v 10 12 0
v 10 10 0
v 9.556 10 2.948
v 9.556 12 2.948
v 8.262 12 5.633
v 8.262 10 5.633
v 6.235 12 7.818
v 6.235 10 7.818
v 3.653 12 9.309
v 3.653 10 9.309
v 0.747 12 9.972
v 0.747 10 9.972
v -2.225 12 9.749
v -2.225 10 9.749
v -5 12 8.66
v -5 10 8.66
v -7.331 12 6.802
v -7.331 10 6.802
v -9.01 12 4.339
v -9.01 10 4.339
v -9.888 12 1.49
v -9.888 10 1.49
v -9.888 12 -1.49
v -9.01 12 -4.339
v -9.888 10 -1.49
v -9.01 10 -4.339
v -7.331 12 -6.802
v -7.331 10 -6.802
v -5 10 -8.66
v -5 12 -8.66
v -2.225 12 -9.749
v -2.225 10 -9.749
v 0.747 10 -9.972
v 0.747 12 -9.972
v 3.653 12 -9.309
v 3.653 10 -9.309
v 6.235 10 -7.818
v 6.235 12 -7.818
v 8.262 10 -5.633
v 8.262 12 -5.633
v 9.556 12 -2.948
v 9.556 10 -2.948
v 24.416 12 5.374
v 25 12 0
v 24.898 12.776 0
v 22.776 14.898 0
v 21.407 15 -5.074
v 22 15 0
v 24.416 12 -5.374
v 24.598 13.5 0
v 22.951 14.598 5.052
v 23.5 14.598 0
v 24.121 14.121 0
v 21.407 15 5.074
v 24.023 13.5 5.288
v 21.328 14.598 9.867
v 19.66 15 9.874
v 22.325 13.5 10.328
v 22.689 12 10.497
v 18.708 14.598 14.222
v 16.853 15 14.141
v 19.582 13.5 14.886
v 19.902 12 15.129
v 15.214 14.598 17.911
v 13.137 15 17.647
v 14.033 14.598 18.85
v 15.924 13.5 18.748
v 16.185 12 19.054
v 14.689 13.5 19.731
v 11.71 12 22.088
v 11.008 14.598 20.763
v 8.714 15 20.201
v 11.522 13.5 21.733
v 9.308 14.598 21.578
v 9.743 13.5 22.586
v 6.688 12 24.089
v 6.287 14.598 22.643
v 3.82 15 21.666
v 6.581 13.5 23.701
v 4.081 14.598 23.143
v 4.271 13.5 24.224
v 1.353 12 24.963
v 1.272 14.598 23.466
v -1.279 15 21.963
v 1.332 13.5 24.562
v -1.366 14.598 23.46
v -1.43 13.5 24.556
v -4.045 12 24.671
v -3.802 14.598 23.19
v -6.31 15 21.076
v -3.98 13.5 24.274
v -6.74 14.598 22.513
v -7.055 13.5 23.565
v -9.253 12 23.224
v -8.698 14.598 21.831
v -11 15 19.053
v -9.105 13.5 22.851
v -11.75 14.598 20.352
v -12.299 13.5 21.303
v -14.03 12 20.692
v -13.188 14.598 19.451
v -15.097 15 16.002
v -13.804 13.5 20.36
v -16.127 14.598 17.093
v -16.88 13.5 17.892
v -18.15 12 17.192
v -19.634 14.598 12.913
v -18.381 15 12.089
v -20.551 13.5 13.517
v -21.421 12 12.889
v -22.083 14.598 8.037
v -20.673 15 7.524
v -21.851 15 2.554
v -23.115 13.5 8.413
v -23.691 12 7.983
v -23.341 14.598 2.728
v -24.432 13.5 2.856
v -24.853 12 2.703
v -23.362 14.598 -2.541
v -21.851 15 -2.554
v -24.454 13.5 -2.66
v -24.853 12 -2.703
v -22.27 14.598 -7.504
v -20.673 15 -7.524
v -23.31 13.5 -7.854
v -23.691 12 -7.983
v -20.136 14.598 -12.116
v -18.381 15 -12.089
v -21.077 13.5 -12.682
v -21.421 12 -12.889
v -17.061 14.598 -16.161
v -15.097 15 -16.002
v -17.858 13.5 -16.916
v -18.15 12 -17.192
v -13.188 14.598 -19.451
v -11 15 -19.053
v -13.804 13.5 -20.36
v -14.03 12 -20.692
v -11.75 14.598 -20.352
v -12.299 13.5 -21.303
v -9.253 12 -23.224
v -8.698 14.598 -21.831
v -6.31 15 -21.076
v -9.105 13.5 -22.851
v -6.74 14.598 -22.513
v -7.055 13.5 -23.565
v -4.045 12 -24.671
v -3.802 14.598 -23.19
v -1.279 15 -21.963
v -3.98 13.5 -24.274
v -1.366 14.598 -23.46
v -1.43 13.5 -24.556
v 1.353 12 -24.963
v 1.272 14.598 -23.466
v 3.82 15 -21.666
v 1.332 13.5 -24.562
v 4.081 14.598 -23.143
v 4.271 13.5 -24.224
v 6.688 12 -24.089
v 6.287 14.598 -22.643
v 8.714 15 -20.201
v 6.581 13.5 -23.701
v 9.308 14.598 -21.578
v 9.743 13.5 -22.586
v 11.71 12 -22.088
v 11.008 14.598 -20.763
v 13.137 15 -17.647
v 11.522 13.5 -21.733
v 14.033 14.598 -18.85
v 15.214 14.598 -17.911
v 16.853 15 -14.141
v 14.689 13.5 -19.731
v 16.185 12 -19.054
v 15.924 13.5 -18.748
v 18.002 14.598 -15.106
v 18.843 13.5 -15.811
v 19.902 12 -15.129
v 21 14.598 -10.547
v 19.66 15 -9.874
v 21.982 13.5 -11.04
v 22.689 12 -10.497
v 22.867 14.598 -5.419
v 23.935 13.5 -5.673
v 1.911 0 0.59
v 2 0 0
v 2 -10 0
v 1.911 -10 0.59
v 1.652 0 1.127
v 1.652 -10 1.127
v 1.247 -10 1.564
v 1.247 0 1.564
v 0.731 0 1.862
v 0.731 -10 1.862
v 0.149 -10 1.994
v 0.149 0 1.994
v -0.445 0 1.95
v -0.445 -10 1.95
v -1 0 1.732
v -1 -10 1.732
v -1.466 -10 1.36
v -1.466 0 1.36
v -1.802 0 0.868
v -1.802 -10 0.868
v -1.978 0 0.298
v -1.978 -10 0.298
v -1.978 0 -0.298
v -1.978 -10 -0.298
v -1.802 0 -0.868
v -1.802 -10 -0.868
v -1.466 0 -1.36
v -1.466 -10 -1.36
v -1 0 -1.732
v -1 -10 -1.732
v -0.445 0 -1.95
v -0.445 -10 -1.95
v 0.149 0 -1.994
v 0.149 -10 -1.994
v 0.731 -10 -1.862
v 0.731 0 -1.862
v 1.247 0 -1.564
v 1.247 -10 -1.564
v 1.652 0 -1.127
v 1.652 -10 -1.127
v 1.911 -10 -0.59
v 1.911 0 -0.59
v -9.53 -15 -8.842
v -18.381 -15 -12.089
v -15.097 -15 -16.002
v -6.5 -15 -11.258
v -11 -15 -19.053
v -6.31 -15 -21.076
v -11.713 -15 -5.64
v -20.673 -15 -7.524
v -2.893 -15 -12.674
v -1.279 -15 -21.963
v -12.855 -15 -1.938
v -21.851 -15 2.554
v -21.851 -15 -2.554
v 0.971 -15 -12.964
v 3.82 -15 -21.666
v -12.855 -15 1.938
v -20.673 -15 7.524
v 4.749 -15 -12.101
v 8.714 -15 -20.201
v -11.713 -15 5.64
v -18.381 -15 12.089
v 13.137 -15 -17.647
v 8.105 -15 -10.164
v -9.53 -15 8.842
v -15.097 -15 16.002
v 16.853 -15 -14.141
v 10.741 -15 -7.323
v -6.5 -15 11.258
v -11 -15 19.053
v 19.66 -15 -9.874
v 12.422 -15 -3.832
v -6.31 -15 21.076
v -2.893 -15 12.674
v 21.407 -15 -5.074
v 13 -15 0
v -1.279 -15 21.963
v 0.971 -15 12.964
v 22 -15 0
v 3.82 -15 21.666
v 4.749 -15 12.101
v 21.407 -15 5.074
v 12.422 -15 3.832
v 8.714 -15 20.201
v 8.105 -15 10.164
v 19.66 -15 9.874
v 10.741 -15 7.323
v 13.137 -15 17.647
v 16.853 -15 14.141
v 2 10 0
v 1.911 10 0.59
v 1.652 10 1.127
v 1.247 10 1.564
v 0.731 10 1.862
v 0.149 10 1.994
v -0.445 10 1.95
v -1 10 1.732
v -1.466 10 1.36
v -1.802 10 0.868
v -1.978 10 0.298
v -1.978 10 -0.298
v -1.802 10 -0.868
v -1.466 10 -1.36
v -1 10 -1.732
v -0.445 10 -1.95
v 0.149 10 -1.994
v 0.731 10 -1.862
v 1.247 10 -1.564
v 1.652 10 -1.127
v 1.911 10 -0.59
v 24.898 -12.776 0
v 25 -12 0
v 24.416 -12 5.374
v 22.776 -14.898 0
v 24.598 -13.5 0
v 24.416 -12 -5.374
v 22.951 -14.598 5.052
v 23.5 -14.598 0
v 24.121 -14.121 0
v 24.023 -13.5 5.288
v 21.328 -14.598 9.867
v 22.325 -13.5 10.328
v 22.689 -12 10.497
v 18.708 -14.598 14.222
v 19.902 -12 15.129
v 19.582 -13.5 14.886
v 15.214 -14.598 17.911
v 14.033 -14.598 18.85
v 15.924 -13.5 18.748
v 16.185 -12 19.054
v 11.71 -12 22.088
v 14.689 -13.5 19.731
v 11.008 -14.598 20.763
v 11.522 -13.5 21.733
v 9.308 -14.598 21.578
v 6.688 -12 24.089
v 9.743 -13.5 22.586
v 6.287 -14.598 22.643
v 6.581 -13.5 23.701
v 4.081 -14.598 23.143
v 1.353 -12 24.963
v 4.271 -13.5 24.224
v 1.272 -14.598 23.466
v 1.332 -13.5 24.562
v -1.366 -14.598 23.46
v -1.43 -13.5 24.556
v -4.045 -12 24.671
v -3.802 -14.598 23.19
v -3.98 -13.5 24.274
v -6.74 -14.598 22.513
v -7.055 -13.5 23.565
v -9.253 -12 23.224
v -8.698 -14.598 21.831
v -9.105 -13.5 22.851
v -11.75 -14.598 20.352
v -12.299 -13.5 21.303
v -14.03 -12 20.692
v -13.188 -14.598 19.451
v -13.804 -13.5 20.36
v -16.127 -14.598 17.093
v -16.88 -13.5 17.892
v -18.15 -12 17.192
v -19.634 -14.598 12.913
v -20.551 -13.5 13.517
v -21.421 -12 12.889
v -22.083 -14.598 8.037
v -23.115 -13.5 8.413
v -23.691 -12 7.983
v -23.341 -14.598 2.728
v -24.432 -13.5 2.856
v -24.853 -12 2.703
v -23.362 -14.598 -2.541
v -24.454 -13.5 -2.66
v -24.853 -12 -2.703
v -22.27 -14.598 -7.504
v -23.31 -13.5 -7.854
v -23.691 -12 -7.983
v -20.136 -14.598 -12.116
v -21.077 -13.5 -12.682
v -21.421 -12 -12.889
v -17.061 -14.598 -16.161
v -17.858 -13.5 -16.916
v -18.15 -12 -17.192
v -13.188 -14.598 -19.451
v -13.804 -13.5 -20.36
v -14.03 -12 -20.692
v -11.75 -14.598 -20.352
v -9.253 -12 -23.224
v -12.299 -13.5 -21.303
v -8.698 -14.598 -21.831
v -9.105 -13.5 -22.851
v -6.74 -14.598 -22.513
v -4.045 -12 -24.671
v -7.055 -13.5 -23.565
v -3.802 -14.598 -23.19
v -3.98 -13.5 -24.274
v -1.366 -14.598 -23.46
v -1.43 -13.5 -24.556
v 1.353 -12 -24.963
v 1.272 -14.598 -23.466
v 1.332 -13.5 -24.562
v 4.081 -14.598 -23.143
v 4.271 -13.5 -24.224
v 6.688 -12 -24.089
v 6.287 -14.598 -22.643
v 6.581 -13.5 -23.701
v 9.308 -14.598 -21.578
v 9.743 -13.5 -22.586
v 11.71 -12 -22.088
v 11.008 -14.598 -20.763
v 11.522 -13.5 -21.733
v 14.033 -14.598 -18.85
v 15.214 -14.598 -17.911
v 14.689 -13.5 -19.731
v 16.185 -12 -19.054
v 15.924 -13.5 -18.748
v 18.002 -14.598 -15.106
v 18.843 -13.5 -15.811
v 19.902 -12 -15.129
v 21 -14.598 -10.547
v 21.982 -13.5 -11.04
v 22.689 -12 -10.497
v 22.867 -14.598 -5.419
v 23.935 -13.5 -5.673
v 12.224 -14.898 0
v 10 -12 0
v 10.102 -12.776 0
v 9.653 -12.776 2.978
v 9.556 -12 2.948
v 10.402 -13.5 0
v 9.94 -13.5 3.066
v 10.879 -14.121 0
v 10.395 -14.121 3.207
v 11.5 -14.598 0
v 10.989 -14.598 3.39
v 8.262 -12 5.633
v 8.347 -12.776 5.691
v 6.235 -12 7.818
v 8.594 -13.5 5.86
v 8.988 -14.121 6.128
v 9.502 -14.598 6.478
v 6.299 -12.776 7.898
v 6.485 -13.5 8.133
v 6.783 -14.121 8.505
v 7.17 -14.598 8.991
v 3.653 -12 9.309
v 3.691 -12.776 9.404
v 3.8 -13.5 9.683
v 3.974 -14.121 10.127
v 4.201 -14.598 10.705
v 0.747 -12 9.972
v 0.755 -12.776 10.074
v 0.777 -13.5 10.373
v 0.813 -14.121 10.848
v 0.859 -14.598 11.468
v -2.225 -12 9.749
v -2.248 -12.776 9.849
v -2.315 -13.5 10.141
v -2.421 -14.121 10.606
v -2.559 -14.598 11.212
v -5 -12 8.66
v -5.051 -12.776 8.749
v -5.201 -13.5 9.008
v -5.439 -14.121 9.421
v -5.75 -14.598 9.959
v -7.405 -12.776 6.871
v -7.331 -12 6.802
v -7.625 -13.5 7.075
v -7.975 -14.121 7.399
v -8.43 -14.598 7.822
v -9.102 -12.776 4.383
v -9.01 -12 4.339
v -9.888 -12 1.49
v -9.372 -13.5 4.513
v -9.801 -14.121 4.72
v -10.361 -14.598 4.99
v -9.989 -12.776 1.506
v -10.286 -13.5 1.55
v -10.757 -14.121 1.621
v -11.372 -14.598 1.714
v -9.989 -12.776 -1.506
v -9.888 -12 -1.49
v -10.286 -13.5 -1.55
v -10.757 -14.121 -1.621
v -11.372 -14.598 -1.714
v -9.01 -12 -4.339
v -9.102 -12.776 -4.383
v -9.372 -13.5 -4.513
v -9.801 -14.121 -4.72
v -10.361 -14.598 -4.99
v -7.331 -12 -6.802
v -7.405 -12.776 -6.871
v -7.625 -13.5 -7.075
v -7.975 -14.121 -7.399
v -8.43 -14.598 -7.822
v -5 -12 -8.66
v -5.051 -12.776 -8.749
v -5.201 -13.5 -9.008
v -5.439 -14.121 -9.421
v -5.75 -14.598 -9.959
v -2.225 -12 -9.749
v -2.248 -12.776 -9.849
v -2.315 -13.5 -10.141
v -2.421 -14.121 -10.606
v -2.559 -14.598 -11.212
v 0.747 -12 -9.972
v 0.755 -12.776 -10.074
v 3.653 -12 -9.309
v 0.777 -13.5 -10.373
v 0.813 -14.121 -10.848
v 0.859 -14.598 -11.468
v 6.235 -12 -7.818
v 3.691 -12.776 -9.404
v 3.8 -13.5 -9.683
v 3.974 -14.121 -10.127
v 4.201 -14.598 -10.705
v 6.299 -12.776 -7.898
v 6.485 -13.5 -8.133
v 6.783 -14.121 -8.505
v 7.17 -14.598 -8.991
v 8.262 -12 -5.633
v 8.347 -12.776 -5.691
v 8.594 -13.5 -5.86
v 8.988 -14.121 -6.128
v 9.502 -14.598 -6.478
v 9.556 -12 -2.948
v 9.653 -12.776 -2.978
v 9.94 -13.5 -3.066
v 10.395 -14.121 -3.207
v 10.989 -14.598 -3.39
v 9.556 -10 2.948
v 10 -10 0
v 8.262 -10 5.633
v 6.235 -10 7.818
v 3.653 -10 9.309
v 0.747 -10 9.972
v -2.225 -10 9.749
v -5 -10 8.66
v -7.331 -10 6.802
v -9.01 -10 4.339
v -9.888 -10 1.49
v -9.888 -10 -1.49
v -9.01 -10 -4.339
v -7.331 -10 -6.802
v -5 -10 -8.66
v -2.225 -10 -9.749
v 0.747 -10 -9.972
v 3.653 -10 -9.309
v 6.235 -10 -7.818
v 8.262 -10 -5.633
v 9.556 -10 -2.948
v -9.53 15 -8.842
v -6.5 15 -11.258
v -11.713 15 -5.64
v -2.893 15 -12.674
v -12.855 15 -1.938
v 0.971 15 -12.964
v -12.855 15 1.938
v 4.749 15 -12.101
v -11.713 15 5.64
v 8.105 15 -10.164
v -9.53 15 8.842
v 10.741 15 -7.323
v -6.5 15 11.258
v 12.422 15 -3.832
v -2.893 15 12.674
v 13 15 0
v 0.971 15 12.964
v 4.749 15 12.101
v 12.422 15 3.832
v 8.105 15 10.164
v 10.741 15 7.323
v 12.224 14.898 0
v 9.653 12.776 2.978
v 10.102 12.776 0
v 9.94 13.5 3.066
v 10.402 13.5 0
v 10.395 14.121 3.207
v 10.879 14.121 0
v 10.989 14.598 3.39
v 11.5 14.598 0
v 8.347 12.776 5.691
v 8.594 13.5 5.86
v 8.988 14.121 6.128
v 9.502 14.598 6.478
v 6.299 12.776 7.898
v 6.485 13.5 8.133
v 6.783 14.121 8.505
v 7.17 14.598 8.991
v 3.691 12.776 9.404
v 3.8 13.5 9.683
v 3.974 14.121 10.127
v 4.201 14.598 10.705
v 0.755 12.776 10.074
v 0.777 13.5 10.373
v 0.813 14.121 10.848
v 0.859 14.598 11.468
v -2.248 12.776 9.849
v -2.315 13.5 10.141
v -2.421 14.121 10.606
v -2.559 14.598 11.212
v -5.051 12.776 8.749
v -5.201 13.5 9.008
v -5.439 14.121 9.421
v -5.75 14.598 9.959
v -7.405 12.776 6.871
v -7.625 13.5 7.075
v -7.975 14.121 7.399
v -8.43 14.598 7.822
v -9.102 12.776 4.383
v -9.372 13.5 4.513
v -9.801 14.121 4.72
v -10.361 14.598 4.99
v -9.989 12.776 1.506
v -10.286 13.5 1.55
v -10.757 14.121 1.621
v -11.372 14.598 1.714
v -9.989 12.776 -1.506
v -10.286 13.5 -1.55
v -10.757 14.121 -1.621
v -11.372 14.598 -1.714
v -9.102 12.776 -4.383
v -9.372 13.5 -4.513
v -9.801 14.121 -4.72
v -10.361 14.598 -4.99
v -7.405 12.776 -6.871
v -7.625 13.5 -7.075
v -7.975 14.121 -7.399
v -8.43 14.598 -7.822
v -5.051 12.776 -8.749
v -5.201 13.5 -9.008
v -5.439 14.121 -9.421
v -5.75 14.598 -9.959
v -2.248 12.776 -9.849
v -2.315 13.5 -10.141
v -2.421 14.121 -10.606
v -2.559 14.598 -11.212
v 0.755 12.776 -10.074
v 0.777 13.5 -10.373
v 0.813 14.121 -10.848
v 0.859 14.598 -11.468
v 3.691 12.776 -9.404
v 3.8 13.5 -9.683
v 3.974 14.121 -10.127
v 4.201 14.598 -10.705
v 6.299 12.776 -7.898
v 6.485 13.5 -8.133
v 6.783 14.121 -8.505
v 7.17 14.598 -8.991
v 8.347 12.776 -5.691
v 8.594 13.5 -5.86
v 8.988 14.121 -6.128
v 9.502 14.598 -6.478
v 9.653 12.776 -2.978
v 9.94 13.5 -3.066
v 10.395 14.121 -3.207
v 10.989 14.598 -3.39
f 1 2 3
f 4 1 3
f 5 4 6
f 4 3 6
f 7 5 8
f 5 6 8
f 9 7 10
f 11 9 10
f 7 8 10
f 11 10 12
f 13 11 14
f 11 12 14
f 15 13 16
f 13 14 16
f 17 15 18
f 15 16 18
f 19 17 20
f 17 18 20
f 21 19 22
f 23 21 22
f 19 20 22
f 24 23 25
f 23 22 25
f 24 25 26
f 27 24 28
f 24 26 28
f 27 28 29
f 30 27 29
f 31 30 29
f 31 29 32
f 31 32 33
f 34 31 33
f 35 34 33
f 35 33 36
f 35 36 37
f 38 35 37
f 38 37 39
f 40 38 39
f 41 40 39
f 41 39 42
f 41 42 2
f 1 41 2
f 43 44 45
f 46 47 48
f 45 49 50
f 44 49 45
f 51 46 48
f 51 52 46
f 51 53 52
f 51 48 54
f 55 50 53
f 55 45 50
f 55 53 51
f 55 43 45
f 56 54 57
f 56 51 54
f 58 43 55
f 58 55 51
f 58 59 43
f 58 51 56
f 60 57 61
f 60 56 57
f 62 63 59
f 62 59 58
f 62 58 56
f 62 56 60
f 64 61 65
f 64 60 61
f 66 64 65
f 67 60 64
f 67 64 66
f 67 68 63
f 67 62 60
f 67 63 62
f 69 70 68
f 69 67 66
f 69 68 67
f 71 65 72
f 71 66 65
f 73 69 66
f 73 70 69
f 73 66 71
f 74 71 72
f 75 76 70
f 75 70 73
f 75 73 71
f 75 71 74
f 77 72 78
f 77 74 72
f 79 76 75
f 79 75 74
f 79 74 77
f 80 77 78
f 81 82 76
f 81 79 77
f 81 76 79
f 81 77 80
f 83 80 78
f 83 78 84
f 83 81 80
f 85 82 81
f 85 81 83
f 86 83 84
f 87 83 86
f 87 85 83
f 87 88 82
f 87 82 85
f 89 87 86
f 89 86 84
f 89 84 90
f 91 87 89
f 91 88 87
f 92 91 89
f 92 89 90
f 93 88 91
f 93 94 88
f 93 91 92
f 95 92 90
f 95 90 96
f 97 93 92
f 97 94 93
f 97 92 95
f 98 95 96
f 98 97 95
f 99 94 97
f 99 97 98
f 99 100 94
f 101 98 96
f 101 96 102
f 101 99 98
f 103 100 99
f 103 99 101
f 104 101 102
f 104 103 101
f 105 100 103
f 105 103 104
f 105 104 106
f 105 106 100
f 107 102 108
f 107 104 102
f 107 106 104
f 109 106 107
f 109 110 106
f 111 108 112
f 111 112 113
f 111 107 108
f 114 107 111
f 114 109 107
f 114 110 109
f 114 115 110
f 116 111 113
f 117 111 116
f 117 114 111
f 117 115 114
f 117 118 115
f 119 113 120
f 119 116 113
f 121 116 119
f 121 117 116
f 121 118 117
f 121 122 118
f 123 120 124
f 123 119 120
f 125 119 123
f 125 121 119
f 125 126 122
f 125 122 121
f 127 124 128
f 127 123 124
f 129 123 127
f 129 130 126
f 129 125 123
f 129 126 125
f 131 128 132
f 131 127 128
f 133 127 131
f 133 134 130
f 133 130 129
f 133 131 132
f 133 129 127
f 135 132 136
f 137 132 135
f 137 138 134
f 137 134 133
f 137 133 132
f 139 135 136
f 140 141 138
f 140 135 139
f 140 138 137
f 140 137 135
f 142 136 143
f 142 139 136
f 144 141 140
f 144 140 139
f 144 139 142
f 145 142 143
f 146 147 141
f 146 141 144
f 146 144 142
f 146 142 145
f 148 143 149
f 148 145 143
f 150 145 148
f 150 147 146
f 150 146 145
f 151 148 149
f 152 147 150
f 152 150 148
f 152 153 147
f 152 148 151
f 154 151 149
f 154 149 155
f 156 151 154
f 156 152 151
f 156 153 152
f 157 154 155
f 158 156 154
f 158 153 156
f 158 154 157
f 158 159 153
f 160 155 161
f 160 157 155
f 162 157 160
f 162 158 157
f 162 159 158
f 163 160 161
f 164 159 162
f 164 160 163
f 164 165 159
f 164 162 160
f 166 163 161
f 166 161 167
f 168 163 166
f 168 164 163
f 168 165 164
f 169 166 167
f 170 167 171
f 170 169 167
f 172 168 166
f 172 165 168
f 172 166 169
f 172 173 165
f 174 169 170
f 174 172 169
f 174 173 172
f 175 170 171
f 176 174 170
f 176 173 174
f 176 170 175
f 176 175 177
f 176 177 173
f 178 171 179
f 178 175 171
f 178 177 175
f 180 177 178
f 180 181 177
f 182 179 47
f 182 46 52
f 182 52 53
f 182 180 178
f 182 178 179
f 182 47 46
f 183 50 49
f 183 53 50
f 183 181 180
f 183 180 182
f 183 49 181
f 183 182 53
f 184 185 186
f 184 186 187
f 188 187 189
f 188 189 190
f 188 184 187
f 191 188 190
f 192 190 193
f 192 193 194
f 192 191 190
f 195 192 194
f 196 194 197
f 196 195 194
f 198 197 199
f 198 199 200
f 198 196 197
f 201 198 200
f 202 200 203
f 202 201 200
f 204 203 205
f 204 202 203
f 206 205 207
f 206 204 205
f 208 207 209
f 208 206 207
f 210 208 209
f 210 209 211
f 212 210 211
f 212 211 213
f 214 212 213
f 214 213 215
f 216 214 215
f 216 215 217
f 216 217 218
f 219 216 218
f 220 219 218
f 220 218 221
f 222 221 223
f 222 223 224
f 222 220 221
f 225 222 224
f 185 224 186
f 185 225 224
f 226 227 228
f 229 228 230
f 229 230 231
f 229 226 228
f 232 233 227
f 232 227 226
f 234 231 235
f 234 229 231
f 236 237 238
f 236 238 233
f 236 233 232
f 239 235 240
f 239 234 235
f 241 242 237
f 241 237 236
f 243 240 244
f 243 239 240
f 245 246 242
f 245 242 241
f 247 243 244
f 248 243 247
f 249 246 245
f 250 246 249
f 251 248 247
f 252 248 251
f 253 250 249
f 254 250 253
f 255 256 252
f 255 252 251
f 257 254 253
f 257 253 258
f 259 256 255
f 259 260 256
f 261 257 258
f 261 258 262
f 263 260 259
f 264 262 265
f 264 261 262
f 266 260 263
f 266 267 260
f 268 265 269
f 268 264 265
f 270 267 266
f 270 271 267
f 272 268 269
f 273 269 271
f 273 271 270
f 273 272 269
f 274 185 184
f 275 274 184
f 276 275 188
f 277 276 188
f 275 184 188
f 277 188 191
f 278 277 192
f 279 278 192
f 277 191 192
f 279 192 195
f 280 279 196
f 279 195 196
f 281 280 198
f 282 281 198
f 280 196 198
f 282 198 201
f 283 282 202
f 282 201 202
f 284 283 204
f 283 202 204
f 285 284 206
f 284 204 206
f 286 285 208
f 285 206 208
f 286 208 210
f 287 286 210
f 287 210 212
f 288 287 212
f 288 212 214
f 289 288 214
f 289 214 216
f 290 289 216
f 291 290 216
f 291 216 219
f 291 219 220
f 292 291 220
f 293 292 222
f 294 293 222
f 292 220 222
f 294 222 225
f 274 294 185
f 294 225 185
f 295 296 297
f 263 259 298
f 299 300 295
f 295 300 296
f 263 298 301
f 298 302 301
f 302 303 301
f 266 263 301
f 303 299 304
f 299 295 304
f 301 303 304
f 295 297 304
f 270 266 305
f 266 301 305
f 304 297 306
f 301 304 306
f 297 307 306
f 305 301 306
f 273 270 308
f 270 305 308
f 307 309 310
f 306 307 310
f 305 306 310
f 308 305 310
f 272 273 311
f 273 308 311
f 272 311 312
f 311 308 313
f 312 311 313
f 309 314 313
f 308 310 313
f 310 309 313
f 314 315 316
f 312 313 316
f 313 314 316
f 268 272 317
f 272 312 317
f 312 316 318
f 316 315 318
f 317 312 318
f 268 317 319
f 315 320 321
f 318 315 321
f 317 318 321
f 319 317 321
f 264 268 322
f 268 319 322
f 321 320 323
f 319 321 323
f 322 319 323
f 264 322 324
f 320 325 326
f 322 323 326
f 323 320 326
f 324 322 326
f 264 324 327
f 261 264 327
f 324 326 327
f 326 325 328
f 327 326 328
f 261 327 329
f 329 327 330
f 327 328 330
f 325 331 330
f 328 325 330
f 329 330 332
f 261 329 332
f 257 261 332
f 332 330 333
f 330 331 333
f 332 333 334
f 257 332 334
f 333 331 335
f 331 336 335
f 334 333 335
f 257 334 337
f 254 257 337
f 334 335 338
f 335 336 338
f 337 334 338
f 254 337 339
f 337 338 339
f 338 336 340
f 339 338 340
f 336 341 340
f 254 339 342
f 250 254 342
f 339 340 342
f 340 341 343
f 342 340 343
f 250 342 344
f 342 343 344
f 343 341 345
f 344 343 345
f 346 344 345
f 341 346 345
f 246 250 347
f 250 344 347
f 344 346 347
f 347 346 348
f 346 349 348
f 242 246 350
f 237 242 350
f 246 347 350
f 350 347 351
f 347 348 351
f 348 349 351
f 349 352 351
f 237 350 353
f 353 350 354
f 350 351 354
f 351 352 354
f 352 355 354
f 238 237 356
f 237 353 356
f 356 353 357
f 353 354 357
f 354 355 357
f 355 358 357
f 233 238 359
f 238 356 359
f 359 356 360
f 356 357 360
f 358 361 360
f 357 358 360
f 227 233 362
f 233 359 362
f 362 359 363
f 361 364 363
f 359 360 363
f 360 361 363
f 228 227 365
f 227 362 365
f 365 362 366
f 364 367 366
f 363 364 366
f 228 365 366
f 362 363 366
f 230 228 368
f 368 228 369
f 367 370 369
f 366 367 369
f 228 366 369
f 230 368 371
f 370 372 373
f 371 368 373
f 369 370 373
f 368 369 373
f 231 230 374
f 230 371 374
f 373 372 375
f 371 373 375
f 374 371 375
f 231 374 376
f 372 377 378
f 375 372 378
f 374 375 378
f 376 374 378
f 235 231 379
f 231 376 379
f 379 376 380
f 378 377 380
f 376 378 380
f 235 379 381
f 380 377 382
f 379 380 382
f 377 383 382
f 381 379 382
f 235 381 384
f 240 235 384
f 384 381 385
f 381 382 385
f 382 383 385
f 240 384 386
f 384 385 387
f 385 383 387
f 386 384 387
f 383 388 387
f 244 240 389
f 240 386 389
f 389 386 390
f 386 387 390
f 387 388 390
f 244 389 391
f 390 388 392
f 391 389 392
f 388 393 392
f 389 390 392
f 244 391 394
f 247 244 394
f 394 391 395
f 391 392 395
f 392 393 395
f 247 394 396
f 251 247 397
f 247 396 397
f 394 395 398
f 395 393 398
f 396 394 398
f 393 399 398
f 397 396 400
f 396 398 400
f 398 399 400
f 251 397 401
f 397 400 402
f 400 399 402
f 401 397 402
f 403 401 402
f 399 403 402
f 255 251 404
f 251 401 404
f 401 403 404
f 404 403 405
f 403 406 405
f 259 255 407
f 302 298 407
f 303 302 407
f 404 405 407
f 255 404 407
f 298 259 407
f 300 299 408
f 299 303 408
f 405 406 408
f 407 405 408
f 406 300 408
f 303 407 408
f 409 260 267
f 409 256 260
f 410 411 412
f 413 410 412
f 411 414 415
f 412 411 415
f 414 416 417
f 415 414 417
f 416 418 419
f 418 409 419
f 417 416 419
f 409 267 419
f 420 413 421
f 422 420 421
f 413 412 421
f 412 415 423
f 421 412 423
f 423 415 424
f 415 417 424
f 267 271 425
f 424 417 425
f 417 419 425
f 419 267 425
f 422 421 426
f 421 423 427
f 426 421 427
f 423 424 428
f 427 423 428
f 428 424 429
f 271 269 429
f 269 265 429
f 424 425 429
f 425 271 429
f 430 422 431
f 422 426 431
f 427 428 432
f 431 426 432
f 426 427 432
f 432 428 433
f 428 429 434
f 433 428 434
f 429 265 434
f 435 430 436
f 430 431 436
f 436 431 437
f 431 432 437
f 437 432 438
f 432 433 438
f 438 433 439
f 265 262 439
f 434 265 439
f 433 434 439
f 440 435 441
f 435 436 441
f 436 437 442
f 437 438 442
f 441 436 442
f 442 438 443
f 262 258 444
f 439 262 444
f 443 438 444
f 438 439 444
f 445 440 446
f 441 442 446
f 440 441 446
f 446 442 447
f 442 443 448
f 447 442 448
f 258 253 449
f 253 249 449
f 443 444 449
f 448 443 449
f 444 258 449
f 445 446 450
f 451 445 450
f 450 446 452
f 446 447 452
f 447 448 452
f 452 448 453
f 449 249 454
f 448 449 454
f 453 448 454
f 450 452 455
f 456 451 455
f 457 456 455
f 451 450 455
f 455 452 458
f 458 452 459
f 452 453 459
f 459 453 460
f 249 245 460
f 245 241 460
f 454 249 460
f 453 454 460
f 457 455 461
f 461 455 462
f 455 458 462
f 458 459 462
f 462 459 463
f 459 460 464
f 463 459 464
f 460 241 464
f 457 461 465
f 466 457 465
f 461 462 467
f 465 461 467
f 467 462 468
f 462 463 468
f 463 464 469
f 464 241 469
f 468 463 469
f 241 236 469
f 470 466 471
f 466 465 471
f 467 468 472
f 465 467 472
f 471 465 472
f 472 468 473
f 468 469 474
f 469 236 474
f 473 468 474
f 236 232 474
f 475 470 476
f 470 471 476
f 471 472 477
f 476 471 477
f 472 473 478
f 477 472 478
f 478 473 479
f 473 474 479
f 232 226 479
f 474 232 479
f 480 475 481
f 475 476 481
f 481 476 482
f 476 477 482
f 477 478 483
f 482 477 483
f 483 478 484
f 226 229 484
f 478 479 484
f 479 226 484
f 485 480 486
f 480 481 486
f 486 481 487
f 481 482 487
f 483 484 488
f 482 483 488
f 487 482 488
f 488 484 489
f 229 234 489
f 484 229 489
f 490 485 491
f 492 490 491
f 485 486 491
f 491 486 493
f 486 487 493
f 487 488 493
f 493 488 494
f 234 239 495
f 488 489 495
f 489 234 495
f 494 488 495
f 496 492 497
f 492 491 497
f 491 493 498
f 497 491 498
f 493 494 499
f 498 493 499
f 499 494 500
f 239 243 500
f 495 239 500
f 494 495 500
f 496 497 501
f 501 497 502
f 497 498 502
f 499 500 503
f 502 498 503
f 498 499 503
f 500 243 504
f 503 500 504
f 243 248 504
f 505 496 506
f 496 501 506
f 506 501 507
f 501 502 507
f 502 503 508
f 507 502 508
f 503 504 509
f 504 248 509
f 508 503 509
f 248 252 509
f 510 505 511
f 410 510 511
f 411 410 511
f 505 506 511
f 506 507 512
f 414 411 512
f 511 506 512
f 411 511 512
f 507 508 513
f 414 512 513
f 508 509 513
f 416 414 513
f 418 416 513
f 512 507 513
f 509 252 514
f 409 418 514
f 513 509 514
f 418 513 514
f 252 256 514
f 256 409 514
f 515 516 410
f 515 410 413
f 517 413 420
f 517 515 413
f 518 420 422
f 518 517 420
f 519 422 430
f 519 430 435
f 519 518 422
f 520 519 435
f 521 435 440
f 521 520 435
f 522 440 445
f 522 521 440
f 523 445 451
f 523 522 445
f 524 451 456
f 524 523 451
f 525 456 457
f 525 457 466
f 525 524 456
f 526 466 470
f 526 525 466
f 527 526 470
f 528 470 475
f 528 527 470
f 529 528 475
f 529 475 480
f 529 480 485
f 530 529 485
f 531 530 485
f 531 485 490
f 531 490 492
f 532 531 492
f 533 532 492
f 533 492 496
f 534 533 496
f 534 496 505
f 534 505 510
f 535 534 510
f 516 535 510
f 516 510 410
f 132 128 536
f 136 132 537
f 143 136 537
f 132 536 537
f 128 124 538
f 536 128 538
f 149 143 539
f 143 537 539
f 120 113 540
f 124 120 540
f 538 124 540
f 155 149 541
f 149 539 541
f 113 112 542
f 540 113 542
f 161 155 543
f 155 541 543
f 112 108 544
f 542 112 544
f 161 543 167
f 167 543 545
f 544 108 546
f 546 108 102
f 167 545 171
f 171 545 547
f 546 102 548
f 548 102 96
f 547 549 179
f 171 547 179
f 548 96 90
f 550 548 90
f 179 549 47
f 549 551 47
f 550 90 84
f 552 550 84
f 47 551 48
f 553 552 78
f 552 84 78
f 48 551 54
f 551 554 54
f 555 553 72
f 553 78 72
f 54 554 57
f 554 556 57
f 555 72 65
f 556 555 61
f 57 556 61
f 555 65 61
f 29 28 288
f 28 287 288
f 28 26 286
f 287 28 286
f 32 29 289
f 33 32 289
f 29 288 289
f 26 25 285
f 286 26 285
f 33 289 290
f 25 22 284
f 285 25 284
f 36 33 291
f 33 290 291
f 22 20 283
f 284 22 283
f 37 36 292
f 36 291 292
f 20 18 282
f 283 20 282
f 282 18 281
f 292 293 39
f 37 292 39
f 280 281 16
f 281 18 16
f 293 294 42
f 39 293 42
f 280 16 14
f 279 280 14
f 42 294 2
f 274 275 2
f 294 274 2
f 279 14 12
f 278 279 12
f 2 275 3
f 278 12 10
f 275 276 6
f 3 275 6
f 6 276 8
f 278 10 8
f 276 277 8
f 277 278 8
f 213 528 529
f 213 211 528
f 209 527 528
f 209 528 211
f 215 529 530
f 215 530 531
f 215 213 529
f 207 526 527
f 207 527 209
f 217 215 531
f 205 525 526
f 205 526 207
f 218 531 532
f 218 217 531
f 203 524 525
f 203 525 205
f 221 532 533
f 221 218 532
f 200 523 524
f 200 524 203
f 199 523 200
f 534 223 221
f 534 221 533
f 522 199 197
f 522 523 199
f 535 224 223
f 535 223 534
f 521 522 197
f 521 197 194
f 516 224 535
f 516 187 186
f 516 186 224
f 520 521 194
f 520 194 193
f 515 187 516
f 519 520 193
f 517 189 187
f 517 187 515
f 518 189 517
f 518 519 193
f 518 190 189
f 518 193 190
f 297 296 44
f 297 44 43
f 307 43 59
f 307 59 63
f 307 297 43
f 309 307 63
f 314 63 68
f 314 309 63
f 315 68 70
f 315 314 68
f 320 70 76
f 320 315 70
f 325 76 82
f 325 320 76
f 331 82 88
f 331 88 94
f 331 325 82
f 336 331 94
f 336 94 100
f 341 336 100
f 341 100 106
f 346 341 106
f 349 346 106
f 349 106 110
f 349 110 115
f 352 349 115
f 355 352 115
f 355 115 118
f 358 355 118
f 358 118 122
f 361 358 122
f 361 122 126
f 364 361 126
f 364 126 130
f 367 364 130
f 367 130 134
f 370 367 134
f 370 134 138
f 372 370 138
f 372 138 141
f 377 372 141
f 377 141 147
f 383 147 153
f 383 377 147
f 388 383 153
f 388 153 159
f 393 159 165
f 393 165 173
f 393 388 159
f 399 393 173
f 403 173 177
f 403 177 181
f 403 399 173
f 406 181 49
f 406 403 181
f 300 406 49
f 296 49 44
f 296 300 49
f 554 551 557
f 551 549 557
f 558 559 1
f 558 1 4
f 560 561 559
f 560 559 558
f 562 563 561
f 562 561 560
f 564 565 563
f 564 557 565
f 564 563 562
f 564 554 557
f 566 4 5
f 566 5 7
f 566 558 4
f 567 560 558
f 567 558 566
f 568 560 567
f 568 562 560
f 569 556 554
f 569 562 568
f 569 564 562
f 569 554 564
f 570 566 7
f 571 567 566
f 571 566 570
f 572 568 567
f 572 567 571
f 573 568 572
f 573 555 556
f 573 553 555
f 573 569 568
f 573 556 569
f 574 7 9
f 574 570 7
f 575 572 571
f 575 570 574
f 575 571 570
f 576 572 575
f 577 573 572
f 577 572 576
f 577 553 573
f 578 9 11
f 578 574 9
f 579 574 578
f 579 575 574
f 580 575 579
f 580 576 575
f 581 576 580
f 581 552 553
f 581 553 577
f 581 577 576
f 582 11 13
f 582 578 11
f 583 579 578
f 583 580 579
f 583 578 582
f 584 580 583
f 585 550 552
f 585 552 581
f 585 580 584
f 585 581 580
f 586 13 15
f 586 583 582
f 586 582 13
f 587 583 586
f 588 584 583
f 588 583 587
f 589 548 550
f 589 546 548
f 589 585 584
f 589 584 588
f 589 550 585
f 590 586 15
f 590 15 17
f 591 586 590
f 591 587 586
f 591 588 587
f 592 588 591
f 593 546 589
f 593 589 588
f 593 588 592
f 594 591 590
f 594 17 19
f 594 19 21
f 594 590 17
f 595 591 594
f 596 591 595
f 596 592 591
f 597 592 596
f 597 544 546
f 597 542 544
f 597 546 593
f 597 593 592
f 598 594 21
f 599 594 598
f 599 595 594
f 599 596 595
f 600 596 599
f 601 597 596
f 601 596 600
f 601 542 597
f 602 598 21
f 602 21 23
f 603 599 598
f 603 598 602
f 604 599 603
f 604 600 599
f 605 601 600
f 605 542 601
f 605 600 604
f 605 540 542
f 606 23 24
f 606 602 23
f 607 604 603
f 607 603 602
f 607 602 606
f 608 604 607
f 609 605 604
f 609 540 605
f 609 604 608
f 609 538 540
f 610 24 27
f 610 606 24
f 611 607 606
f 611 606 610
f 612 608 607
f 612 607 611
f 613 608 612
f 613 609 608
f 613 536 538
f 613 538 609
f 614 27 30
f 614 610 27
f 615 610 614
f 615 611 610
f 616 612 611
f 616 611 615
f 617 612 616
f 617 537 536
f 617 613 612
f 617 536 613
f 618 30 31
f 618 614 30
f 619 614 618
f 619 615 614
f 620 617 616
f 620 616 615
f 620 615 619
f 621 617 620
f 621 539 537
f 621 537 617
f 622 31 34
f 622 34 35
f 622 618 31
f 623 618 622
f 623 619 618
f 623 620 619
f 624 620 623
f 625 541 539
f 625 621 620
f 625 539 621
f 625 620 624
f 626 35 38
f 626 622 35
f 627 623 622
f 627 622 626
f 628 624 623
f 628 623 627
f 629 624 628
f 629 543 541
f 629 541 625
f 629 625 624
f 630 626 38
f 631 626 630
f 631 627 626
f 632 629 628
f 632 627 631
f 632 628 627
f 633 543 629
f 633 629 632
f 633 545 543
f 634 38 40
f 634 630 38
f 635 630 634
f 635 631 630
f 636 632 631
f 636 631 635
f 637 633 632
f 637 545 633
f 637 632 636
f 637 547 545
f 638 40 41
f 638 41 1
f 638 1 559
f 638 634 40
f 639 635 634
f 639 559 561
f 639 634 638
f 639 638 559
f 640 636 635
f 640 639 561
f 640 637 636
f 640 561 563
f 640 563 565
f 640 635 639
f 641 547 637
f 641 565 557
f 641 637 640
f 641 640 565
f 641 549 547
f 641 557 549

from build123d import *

# Parameters (mm, degrees)
F0_R          = 25
F0_R_2        = 10
F1_DEPTH      = 15
F1_DEPTH_BACK = 15
F0_R_3        = 2
F2_DEPTH      = 10
F2_DEPTH_BACK = 10
F3_R          = 3


with BuildPart() as f1:
    # F0 (on Front) → F1 (new body, two sides)
    with BuildSketch(Plane.XZ) as f1_sk:
        Circle(F0_R)
        Circle(F0_R_2, mode=Mode.SUBTRACT)
    extrude(amount=F1_DEPTH)
    extrude(f1_sk.sketch, amount=-F1_DEPTH_BACK)

    # F0 (on Front) → F2 (join, two sides)
    with BuildSketch(Plane.XZ) as f2_sk:
        Circle(F0_R_2)
        Circle(F0_R_3, mode=Mode.SUBTRACT)
    extrude(amount=F2_DEPTH)
    extrude(f2_sk.sketch, amount=-F2_DEPTH_BACK)

    # F3
    f3_edges = [f1.edges().sort_by_distance(p)[0] for p in [
        (-25, 15, 0),
        (-25, -15, 0),
        (-10, -15, 0),
        (-10, 15, 0),
    ]]
    fillet(f3_edges, radius=F3_R)


solid = f1.part
